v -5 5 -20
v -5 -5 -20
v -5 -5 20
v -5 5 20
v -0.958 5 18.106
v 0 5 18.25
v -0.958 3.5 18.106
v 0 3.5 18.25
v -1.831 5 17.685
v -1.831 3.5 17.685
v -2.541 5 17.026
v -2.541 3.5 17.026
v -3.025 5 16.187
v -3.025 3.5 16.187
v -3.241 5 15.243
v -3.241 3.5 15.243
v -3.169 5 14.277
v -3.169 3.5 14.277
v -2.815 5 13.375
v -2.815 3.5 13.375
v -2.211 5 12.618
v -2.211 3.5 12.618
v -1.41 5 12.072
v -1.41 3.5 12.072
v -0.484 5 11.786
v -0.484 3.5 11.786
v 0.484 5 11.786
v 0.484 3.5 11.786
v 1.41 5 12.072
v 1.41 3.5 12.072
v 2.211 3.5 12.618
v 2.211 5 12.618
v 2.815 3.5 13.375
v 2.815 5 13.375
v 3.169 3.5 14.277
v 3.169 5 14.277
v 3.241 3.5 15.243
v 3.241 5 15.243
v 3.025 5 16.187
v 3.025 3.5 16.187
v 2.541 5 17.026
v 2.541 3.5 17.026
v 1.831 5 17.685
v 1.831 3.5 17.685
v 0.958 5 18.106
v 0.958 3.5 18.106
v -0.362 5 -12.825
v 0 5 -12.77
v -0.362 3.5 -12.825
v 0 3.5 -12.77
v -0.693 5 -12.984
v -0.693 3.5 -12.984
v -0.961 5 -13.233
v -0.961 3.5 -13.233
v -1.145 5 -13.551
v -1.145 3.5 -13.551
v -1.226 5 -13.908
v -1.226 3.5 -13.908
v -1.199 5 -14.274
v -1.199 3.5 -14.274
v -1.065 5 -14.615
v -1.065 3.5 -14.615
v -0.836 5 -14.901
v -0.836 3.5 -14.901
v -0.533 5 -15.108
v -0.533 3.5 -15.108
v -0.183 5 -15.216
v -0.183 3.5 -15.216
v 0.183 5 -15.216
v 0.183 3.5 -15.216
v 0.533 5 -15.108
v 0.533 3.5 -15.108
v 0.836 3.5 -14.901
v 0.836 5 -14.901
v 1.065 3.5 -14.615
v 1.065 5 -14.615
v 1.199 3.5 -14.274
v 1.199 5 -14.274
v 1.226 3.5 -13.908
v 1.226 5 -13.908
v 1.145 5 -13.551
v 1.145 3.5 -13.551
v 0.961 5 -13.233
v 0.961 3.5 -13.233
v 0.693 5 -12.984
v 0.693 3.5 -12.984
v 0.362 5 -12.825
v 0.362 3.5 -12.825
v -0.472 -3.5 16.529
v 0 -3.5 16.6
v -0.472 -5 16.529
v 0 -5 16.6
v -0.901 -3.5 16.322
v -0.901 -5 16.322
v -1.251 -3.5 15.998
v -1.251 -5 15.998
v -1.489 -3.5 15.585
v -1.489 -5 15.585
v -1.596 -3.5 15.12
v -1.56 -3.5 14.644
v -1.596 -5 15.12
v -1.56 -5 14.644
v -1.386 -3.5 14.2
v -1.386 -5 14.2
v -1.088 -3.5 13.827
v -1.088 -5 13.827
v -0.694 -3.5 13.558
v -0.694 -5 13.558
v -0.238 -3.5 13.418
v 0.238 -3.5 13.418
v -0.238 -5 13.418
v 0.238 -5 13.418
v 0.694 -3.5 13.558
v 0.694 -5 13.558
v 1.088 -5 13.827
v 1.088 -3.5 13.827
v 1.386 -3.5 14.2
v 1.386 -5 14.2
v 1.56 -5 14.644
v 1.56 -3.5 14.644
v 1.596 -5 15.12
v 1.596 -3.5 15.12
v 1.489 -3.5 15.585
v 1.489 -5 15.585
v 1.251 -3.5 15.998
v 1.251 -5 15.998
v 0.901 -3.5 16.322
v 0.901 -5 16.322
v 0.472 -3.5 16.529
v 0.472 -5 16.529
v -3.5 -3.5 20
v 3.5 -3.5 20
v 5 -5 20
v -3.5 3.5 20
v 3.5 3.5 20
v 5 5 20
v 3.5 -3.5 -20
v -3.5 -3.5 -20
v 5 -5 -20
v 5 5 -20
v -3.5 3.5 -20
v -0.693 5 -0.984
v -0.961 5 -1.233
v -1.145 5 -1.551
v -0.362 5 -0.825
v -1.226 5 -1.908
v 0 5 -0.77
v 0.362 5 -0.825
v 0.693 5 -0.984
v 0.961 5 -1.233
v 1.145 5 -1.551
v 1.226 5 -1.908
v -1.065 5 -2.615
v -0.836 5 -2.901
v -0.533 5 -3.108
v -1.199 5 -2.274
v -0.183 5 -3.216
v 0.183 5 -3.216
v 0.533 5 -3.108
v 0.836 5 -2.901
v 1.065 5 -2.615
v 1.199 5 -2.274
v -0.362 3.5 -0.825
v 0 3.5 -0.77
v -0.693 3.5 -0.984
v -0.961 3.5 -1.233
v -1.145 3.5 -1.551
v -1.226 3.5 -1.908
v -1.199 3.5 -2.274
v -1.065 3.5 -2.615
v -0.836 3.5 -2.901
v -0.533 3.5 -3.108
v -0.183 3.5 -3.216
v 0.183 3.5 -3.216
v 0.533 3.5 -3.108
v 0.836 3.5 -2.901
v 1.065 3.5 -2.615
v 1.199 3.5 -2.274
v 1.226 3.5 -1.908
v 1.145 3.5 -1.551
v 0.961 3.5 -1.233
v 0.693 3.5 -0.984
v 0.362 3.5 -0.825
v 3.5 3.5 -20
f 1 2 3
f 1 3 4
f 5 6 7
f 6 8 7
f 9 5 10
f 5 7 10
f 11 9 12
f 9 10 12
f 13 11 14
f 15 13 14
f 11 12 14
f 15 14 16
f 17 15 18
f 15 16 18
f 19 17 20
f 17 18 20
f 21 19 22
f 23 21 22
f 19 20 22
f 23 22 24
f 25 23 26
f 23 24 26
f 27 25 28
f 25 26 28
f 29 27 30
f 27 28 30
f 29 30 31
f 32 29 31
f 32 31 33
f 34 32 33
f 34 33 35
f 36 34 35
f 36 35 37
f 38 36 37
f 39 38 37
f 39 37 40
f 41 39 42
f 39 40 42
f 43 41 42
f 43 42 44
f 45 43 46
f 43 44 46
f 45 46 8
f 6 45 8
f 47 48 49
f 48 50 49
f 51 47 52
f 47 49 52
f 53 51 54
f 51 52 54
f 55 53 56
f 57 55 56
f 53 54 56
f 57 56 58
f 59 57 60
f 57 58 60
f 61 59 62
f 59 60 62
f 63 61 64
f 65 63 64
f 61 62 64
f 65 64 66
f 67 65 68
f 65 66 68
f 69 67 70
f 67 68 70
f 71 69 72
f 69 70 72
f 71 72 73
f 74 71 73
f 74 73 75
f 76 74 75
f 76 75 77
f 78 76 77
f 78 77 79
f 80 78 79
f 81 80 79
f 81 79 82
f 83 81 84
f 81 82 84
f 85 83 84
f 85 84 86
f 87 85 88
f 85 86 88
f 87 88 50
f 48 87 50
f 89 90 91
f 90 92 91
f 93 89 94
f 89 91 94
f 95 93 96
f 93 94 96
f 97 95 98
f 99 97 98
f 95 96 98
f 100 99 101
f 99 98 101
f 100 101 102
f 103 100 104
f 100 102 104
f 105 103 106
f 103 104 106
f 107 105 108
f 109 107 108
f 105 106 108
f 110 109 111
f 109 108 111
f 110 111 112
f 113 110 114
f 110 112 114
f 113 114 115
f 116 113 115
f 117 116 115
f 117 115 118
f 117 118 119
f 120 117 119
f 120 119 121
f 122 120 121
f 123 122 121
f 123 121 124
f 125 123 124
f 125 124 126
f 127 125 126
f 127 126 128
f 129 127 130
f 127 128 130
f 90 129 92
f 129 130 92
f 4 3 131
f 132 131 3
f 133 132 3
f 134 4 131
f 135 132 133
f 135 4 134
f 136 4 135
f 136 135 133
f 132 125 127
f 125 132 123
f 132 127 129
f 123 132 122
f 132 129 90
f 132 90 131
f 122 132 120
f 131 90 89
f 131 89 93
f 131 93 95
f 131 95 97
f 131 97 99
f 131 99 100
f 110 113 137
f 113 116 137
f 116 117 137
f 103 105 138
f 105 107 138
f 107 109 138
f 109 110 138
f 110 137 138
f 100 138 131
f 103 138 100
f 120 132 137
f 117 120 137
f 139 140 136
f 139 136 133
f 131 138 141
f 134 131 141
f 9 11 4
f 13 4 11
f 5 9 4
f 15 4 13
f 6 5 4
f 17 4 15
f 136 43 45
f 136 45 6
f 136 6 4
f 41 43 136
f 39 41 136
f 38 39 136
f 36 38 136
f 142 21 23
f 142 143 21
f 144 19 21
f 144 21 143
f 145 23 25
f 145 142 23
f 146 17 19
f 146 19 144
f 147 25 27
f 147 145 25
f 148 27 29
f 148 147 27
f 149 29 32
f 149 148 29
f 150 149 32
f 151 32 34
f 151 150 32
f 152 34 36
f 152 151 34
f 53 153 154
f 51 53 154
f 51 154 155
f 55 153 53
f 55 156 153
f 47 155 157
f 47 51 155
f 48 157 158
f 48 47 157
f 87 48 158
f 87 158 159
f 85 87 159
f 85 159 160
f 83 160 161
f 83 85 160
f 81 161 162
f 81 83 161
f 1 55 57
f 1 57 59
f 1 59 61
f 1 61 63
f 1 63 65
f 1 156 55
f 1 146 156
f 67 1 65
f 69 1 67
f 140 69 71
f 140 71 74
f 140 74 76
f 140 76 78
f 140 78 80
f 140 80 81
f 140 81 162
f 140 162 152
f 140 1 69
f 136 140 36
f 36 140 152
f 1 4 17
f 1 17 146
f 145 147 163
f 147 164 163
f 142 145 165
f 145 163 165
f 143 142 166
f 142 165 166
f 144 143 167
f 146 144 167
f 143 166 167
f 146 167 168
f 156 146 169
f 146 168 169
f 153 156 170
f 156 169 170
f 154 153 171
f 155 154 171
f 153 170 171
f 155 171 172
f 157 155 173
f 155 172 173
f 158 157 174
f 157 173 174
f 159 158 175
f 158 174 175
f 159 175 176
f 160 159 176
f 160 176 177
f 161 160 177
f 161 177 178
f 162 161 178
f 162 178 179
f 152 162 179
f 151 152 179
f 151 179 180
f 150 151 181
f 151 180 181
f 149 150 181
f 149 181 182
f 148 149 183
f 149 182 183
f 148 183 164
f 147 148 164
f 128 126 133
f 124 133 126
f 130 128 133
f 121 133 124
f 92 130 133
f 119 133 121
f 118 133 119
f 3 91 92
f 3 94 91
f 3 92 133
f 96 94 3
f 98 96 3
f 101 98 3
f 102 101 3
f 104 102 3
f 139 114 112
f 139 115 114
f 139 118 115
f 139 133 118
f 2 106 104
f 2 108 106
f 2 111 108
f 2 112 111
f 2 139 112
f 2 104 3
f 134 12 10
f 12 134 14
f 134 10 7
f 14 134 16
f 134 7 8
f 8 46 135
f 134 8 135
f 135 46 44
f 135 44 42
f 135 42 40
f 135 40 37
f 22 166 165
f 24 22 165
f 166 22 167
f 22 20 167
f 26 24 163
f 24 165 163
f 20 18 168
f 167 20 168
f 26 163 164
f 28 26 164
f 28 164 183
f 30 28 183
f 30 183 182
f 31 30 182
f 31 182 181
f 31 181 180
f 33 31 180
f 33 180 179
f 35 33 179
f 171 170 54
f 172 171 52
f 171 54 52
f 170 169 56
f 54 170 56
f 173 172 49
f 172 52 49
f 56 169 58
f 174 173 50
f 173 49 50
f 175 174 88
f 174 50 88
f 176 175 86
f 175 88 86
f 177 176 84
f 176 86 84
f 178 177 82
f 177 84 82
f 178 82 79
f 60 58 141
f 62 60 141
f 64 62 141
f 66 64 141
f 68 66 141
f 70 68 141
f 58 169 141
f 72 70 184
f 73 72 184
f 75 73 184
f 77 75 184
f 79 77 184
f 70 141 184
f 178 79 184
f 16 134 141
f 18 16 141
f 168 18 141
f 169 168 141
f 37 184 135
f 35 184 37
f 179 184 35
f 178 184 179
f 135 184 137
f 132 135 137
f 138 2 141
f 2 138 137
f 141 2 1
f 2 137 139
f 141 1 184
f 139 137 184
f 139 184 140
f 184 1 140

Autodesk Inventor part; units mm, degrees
ref_plane "YZ Plane" through (0, 0, 0) normal (1, 0, 0) x (0, 1, 0)
ref_plane "XZ Plane" through (0, 0, 0) normal (0, 1, 0) x (-1, 0, 0)
ref_plane "XY Plane" through (0, 0, 0) normal (0, 0, 1) x (1, 0, 0)
sketch "Náčrt1" plane through (0, 0, 0) normal (0, 0, 1) x (1, 0, 0)
  line L0 (0, 7) -> (0, -7) projected
  line L1 (-7, 0) -> (7, 0) projected
  line L2 (-3.5, 3.5) -> (3.5, 3.5)
  line L3 (3.5, 3.5) -> (3.5, -3.5)
  line L4 (3.5, -3.5) -> (-3.5, -3.5)
  line L5 (-3.5, -3.5) -> (-3.5, 3.5)
  line L6 (-5, 5) -> (5, 5)
  line L7 (5, 5) -> (5, -5)
  line L8 (5, -5) -> (-5, -5)
  line L9 (-5, -5) -> (-5, 5)
  point P0 (0, 0)
  dimension "d1" = 10
  dimension "d2" = 10
  dimension "d3" = 1.5
  dimension "d4" = 1.5
  dimension "d5" = 1.5
  dimension "d6" = 1.5
extrude "Vysunutí1" add sketch "Náčrt1" along normal mid plane 40 contours L6 L7 L1 L3 L2 L0 | L0 L2 L5 L1 L9 L6 | L1 L5 L4 L0 L8 L9 | L7 L8 L0 L4 L3 L1
sketch "Náčrt2" plane through (-5, 5, 20) normal (0, 1, 0) x (1, 0, 0)
  line L0 (12, 20) -> (-2, 20) projected
  line L1 (5, 48) -> (5, -8) projected
  line L2 (10, 0) -> (0, 0) projected
  line L3 (0, 40) -> (0, 0) projected
  point P0 (5, 20)
  point P1 (5, 5)
  dimension "d10" = 5
  dimension "d11" = 5
hole "Díra1" at (0, 5, 15) direction (0, -1, 0) diameter 3.2 end through all counterbore diameter 6.5 counterbore depth 2
sketch "Náčrt3" plane through (-5, 5, 20) normal (0, 1, 0) x (1, 0, 0)
  line L0 (0, 40) -> (0, 0) projected
  line L1 (0, 40) -> (10, 40) projected
  point P0 (5, 20)
  point P1 (5, 34)
  point P2 (5, 22)
  dimension "d19" = 5
  dimension "d20" = 5
  dimension "d21" = 12
  dimension "d22" = 6
hole "Díra2" at (0, 5, -14) at (0, 5, -2) direction (0, -1, 0) diameter 2.459 depth 1.5 thread size "M3x0.5" class "6H" standard "ISO Metric profile"
properties part number "y_standoff" material "Hliník 6061"
